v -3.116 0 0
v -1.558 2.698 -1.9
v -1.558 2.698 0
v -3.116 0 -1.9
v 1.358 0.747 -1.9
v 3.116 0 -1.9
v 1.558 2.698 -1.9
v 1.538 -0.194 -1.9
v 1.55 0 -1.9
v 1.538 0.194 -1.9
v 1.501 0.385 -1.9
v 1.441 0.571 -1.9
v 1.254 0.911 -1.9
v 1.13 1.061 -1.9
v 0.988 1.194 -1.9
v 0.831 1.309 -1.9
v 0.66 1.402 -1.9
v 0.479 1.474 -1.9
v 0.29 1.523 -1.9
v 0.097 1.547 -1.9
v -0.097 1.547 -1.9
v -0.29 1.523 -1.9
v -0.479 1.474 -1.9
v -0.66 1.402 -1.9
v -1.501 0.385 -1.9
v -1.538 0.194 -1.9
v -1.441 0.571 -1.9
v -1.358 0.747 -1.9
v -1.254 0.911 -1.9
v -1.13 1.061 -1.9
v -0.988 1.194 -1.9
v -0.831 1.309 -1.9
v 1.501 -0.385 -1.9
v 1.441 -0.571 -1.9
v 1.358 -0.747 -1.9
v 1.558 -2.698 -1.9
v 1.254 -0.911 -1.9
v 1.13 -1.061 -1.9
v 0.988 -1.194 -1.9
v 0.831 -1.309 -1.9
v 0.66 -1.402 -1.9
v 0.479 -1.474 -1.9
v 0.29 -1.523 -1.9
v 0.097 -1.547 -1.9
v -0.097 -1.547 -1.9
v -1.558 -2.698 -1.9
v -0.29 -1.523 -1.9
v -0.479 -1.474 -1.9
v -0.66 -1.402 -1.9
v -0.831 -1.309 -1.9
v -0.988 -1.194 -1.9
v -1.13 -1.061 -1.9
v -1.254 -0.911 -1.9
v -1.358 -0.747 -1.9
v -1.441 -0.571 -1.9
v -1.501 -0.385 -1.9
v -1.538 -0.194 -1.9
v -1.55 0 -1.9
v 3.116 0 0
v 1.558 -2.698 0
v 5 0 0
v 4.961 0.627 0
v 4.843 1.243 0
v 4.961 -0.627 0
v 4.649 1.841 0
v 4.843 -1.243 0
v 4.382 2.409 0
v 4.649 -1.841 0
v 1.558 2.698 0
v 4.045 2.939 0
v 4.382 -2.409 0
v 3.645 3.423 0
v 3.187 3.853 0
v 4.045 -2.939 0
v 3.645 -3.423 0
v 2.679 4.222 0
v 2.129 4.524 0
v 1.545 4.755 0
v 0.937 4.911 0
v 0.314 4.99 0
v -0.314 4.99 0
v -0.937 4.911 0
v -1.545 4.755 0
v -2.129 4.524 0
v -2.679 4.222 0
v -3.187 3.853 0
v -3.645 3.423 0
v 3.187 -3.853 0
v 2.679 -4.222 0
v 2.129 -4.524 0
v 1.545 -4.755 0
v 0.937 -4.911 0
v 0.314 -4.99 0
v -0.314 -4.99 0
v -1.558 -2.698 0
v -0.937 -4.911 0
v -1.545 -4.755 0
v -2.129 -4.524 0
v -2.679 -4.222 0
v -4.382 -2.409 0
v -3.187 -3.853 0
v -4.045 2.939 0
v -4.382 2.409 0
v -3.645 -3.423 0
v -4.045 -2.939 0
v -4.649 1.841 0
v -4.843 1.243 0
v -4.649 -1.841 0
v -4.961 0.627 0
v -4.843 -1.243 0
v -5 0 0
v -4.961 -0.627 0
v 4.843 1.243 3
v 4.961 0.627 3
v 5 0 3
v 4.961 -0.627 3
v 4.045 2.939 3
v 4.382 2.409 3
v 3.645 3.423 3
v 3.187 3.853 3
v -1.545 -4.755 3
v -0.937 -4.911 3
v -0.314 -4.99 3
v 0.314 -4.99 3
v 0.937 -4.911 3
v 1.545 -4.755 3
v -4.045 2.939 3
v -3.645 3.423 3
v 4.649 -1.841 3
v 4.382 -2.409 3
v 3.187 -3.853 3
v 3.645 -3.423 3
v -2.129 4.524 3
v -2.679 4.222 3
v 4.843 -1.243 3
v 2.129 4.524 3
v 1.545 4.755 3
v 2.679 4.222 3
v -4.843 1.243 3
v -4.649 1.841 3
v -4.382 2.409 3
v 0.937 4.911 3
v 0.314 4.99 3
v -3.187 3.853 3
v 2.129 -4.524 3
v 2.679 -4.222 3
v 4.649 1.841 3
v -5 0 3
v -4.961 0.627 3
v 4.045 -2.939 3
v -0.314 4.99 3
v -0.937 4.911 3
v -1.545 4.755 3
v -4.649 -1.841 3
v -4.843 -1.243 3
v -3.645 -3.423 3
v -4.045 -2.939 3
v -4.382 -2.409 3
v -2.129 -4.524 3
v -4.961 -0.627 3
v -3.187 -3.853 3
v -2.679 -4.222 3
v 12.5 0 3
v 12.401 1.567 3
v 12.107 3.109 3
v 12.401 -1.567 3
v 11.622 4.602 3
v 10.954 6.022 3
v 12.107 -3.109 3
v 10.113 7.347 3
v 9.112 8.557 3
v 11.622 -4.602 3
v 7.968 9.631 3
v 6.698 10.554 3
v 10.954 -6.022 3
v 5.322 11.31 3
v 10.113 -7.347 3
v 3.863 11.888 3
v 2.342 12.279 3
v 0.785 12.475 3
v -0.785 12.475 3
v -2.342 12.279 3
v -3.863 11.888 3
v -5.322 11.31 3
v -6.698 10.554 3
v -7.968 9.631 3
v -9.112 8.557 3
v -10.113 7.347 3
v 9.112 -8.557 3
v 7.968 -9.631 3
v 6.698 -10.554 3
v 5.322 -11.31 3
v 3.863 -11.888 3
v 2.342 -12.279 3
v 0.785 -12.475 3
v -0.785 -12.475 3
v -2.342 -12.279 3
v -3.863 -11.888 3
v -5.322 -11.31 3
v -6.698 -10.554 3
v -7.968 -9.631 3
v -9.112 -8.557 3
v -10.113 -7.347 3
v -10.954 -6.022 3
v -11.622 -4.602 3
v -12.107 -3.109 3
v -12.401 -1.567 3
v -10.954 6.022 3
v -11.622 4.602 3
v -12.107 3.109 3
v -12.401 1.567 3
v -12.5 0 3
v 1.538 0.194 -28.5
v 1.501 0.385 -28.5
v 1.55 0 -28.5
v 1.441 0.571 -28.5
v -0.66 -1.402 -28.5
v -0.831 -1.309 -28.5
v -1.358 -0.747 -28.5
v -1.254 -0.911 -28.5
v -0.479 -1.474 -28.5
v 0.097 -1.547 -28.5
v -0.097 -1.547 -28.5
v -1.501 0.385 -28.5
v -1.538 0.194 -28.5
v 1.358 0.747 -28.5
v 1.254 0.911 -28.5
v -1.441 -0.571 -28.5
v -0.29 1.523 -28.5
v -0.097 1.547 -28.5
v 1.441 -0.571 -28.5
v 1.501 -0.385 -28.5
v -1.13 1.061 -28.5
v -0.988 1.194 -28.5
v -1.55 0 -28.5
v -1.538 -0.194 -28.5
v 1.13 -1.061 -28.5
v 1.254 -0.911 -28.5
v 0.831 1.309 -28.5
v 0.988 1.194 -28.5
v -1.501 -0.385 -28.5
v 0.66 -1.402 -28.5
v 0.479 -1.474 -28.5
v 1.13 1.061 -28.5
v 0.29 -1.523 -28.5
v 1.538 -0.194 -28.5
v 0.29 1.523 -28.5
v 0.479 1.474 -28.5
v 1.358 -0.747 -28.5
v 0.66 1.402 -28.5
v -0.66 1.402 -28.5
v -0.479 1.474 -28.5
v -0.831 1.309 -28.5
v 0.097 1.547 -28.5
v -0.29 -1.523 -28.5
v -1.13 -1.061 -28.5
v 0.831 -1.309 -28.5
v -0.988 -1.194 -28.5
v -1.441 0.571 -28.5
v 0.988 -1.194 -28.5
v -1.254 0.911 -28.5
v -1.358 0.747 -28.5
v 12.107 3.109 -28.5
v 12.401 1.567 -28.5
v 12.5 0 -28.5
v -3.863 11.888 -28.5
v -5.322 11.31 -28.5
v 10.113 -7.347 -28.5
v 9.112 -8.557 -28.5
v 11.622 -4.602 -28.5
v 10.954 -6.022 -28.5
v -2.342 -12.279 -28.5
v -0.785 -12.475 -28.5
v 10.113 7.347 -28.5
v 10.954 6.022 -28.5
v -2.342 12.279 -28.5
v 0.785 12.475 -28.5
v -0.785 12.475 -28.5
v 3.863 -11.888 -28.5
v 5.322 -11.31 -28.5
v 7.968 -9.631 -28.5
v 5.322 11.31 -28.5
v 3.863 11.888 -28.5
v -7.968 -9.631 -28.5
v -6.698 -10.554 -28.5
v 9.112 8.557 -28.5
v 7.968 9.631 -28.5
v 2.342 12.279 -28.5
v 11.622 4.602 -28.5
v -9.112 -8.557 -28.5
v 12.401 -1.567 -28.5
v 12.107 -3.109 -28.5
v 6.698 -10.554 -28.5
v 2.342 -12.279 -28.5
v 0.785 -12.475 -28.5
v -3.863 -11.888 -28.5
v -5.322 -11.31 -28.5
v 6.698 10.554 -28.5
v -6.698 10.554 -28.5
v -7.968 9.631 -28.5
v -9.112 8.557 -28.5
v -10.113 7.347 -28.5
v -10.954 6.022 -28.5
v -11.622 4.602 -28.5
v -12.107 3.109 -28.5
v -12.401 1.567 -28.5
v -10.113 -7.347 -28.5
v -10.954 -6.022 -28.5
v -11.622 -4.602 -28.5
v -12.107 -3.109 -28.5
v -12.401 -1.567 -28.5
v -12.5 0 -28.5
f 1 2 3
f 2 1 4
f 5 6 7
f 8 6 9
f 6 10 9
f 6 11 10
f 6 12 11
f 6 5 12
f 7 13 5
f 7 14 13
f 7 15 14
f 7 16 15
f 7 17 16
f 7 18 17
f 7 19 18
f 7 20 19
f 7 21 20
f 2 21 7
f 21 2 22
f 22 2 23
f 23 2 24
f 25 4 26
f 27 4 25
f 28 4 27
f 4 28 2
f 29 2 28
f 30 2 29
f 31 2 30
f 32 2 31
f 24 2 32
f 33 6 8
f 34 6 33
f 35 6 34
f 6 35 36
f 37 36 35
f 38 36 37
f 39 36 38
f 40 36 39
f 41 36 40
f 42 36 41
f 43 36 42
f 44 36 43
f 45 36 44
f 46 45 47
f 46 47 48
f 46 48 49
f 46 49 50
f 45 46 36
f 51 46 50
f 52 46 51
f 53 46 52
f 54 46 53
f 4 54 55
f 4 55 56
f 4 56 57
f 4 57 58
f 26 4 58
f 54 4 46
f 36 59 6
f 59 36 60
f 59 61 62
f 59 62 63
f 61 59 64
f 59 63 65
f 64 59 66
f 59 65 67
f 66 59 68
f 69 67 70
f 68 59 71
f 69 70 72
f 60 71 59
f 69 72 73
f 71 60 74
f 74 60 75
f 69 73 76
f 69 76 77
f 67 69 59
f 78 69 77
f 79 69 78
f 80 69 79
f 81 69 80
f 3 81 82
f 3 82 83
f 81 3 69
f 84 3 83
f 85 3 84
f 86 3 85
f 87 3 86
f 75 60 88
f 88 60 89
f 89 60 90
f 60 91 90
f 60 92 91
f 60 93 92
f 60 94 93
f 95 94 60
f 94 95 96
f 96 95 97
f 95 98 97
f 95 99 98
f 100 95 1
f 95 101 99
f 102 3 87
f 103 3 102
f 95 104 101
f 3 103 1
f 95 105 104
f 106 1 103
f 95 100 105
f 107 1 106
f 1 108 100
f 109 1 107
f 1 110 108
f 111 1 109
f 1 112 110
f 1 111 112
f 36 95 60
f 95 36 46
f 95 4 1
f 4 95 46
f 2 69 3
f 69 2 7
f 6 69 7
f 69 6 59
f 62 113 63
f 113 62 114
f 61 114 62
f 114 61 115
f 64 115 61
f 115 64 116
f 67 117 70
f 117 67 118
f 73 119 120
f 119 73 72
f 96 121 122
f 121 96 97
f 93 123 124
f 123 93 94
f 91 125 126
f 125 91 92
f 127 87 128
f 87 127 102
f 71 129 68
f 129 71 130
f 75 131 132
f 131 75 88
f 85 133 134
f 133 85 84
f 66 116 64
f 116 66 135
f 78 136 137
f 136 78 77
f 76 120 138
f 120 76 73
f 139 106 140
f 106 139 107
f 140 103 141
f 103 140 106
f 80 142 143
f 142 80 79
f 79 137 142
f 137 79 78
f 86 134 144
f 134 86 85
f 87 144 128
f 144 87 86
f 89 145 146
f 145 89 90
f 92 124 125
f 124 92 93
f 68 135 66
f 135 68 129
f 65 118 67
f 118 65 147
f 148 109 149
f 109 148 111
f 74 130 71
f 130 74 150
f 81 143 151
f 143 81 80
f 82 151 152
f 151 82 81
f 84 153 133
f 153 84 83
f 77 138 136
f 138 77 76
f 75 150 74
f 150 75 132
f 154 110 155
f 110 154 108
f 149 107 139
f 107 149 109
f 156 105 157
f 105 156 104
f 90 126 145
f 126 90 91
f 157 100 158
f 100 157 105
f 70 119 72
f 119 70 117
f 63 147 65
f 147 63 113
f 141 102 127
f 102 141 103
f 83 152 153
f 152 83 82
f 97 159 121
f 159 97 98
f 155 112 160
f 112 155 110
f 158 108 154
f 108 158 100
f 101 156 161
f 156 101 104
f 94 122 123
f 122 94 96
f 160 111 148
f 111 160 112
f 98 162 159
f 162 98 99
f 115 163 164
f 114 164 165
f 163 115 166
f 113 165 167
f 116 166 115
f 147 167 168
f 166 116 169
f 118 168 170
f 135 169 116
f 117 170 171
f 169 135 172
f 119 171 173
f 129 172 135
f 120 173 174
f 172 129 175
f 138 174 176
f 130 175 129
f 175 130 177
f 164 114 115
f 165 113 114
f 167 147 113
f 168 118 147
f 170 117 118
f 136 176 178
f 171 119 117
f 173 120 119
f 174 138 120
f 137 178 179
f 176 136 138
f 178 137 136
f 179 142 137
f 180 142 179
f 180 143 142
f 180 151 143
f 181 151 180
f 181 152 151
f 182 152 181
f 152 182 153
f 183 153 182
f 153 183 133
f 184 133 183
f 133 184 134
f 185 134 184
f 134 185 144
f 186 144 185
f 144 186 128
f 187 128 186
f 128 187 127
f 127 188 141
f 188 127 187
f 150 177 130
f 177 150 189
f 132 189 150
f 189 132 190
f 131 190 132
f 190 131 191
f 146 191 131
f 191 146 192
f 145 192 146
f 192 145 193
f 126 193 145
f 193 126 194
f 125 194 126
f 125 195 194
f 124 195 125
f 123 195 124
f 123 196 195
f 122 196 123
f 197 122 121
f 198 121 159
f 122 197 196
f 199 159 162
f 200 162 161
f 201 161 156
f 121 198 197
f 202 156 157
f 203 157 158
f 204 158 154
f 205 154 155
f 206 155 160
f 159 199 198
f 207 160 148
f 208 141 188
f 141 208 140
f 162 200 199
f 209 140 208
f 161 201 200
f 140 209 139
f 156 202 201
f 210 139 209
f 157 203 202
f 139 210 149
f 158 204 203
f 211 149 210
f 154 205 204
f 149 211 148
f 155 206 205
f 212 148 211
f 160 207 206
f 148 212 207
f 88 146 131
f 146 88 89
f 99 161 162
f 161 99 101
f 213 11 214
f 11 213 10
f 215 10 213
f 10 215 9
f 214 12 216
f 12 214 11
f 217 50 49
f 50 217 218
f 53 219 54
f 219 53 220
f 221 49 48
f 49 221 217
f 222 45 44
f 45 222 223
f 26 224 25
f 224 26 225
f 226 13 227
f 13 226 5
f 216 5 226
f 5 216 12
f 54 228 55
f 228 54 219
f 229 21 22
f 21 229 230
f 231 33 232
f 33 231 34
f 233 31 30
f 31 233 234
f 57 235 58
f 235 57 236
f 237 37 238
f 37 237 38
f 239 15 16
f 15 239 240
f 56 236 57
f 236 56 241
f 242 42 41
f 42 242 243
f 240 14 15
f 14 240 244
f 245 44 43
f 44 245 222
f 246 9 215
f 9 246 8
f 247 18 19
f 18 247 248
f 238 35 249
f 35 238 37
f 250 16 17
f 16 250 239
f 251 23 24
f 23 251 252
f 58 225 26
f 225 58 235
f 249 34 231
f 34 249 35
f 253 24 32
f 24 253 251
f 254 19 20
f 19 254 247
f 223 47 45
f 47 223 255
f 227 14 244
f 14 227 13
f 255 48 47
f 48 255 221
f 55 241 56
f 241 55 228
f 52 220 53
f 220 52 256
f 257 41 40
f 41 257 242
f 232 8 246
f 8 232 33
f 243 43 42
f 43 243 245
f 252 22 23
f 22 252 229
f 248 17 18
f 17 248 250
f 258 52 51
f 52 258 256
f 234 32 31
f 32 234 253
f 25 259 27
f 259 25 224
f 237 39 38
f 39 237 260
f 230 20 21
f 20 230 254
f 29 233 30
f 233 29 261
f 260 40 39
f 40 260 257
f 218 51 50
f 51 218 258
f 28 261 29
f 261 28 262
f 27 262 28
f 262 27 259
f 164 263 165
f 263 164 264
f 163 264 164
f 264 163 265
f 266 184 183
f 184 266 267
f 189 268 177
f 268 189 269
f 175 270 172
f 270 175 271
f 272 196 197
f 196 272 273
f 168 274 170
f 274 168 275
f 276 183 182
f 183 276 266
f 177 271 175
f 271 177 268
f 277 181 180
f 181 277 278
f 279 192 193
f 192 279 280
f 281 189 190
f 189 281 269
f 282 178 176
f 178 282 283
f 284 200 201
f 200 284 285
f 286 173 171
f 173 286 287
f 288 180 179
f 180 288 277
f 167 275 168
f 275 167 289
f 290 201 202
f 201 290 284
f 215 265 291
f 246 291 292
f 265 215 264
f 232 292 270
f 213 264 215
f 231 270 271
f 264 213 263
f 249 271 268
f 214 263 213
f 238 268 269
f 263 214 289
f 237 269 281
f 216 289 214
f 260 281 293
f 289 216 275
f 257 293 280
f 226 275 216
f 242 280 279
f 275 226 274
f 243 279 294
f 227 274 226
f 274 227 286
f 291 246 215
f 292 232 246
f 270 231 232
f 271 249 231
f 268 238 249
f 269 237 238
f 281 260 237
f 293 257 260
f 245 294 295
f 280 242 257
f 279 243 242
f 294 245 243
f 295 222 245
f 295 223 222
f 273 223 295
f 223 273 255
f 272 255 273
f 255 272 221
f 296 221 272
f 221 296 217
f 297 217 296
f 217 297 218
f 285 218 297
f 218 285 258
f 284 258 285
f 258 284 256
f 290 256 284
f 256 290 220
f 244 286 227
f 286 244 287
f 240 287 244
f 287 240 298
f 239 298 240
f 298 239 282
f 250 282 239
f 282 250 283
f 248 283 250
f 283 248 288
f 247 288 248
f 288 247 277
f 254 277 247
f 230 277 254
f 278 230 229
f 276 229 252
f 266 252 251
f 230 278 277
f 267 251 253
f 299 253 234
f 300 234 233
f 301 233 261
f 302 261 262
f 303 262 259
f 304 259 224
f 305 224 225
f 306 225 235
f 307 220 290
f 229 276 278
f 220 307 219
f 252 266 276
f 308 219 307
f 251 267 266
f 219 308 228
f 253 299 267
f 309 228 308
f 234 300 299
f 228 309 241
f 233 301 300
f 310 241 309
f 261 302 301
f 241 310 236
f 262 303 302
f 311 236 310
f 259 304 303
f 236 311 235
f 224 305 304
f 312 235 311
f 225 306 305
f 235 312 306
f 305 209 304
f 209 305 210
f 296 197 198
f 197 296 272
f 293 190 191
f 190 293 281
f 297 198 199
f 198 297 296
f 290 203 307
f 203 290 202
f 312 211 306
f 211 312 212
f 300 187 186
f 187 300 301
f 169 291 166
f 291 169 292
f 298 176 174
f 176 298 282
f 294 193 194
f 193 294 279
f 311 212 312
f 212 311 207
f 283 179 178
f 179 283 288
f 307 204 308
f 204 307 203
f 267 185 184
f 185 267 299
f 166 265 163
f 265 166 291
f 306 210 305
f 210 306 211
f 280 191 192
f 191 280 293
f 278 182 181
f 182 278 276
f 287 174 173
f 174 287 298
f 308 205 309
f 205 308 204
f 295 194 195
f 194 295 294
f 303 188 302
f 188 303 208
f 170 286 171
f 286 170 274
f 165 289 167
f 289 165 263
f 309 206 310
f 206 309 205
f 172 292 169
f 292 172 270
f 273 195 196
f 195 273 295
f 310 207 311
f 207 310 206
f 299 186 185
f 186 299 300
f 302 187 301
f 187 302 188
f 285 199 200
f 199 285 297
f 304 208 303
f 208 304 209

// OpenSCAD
$fn = 50;

difference() {
	union() {
		translate(v = [0, 0, -28.5]) {
			cylinder(h = 31.5, r = 12.5);
		}
	}
	union() {
		translate(v = [0, 0, 0]) {
			rotate(a = [0, 0, 0]) {
				difference() {
					union() {
						translate(v = [0, 0, -1.9]) {
							linear_extrude(height = 1.9) {
								polygon(points = [[3.1158, 0.0], [1.5579000000000005, 2.698361953111554], [-1.5578999999999994, 2.6983619531115544], [-3.1158, 3.815754496783323e-16], [-1.5579000000000014, -2.6983619531115535], [1.557899999999998, -2.6983619531115552]]);
							}
						}
					}
					union();
				}
			}
		}
		#cylinder(h = 3, r = 5.0);
		#translate(v = [0, 0, -100.0]) {
			cylinder(h = 200, r = 1.55);
		}
	}
}
